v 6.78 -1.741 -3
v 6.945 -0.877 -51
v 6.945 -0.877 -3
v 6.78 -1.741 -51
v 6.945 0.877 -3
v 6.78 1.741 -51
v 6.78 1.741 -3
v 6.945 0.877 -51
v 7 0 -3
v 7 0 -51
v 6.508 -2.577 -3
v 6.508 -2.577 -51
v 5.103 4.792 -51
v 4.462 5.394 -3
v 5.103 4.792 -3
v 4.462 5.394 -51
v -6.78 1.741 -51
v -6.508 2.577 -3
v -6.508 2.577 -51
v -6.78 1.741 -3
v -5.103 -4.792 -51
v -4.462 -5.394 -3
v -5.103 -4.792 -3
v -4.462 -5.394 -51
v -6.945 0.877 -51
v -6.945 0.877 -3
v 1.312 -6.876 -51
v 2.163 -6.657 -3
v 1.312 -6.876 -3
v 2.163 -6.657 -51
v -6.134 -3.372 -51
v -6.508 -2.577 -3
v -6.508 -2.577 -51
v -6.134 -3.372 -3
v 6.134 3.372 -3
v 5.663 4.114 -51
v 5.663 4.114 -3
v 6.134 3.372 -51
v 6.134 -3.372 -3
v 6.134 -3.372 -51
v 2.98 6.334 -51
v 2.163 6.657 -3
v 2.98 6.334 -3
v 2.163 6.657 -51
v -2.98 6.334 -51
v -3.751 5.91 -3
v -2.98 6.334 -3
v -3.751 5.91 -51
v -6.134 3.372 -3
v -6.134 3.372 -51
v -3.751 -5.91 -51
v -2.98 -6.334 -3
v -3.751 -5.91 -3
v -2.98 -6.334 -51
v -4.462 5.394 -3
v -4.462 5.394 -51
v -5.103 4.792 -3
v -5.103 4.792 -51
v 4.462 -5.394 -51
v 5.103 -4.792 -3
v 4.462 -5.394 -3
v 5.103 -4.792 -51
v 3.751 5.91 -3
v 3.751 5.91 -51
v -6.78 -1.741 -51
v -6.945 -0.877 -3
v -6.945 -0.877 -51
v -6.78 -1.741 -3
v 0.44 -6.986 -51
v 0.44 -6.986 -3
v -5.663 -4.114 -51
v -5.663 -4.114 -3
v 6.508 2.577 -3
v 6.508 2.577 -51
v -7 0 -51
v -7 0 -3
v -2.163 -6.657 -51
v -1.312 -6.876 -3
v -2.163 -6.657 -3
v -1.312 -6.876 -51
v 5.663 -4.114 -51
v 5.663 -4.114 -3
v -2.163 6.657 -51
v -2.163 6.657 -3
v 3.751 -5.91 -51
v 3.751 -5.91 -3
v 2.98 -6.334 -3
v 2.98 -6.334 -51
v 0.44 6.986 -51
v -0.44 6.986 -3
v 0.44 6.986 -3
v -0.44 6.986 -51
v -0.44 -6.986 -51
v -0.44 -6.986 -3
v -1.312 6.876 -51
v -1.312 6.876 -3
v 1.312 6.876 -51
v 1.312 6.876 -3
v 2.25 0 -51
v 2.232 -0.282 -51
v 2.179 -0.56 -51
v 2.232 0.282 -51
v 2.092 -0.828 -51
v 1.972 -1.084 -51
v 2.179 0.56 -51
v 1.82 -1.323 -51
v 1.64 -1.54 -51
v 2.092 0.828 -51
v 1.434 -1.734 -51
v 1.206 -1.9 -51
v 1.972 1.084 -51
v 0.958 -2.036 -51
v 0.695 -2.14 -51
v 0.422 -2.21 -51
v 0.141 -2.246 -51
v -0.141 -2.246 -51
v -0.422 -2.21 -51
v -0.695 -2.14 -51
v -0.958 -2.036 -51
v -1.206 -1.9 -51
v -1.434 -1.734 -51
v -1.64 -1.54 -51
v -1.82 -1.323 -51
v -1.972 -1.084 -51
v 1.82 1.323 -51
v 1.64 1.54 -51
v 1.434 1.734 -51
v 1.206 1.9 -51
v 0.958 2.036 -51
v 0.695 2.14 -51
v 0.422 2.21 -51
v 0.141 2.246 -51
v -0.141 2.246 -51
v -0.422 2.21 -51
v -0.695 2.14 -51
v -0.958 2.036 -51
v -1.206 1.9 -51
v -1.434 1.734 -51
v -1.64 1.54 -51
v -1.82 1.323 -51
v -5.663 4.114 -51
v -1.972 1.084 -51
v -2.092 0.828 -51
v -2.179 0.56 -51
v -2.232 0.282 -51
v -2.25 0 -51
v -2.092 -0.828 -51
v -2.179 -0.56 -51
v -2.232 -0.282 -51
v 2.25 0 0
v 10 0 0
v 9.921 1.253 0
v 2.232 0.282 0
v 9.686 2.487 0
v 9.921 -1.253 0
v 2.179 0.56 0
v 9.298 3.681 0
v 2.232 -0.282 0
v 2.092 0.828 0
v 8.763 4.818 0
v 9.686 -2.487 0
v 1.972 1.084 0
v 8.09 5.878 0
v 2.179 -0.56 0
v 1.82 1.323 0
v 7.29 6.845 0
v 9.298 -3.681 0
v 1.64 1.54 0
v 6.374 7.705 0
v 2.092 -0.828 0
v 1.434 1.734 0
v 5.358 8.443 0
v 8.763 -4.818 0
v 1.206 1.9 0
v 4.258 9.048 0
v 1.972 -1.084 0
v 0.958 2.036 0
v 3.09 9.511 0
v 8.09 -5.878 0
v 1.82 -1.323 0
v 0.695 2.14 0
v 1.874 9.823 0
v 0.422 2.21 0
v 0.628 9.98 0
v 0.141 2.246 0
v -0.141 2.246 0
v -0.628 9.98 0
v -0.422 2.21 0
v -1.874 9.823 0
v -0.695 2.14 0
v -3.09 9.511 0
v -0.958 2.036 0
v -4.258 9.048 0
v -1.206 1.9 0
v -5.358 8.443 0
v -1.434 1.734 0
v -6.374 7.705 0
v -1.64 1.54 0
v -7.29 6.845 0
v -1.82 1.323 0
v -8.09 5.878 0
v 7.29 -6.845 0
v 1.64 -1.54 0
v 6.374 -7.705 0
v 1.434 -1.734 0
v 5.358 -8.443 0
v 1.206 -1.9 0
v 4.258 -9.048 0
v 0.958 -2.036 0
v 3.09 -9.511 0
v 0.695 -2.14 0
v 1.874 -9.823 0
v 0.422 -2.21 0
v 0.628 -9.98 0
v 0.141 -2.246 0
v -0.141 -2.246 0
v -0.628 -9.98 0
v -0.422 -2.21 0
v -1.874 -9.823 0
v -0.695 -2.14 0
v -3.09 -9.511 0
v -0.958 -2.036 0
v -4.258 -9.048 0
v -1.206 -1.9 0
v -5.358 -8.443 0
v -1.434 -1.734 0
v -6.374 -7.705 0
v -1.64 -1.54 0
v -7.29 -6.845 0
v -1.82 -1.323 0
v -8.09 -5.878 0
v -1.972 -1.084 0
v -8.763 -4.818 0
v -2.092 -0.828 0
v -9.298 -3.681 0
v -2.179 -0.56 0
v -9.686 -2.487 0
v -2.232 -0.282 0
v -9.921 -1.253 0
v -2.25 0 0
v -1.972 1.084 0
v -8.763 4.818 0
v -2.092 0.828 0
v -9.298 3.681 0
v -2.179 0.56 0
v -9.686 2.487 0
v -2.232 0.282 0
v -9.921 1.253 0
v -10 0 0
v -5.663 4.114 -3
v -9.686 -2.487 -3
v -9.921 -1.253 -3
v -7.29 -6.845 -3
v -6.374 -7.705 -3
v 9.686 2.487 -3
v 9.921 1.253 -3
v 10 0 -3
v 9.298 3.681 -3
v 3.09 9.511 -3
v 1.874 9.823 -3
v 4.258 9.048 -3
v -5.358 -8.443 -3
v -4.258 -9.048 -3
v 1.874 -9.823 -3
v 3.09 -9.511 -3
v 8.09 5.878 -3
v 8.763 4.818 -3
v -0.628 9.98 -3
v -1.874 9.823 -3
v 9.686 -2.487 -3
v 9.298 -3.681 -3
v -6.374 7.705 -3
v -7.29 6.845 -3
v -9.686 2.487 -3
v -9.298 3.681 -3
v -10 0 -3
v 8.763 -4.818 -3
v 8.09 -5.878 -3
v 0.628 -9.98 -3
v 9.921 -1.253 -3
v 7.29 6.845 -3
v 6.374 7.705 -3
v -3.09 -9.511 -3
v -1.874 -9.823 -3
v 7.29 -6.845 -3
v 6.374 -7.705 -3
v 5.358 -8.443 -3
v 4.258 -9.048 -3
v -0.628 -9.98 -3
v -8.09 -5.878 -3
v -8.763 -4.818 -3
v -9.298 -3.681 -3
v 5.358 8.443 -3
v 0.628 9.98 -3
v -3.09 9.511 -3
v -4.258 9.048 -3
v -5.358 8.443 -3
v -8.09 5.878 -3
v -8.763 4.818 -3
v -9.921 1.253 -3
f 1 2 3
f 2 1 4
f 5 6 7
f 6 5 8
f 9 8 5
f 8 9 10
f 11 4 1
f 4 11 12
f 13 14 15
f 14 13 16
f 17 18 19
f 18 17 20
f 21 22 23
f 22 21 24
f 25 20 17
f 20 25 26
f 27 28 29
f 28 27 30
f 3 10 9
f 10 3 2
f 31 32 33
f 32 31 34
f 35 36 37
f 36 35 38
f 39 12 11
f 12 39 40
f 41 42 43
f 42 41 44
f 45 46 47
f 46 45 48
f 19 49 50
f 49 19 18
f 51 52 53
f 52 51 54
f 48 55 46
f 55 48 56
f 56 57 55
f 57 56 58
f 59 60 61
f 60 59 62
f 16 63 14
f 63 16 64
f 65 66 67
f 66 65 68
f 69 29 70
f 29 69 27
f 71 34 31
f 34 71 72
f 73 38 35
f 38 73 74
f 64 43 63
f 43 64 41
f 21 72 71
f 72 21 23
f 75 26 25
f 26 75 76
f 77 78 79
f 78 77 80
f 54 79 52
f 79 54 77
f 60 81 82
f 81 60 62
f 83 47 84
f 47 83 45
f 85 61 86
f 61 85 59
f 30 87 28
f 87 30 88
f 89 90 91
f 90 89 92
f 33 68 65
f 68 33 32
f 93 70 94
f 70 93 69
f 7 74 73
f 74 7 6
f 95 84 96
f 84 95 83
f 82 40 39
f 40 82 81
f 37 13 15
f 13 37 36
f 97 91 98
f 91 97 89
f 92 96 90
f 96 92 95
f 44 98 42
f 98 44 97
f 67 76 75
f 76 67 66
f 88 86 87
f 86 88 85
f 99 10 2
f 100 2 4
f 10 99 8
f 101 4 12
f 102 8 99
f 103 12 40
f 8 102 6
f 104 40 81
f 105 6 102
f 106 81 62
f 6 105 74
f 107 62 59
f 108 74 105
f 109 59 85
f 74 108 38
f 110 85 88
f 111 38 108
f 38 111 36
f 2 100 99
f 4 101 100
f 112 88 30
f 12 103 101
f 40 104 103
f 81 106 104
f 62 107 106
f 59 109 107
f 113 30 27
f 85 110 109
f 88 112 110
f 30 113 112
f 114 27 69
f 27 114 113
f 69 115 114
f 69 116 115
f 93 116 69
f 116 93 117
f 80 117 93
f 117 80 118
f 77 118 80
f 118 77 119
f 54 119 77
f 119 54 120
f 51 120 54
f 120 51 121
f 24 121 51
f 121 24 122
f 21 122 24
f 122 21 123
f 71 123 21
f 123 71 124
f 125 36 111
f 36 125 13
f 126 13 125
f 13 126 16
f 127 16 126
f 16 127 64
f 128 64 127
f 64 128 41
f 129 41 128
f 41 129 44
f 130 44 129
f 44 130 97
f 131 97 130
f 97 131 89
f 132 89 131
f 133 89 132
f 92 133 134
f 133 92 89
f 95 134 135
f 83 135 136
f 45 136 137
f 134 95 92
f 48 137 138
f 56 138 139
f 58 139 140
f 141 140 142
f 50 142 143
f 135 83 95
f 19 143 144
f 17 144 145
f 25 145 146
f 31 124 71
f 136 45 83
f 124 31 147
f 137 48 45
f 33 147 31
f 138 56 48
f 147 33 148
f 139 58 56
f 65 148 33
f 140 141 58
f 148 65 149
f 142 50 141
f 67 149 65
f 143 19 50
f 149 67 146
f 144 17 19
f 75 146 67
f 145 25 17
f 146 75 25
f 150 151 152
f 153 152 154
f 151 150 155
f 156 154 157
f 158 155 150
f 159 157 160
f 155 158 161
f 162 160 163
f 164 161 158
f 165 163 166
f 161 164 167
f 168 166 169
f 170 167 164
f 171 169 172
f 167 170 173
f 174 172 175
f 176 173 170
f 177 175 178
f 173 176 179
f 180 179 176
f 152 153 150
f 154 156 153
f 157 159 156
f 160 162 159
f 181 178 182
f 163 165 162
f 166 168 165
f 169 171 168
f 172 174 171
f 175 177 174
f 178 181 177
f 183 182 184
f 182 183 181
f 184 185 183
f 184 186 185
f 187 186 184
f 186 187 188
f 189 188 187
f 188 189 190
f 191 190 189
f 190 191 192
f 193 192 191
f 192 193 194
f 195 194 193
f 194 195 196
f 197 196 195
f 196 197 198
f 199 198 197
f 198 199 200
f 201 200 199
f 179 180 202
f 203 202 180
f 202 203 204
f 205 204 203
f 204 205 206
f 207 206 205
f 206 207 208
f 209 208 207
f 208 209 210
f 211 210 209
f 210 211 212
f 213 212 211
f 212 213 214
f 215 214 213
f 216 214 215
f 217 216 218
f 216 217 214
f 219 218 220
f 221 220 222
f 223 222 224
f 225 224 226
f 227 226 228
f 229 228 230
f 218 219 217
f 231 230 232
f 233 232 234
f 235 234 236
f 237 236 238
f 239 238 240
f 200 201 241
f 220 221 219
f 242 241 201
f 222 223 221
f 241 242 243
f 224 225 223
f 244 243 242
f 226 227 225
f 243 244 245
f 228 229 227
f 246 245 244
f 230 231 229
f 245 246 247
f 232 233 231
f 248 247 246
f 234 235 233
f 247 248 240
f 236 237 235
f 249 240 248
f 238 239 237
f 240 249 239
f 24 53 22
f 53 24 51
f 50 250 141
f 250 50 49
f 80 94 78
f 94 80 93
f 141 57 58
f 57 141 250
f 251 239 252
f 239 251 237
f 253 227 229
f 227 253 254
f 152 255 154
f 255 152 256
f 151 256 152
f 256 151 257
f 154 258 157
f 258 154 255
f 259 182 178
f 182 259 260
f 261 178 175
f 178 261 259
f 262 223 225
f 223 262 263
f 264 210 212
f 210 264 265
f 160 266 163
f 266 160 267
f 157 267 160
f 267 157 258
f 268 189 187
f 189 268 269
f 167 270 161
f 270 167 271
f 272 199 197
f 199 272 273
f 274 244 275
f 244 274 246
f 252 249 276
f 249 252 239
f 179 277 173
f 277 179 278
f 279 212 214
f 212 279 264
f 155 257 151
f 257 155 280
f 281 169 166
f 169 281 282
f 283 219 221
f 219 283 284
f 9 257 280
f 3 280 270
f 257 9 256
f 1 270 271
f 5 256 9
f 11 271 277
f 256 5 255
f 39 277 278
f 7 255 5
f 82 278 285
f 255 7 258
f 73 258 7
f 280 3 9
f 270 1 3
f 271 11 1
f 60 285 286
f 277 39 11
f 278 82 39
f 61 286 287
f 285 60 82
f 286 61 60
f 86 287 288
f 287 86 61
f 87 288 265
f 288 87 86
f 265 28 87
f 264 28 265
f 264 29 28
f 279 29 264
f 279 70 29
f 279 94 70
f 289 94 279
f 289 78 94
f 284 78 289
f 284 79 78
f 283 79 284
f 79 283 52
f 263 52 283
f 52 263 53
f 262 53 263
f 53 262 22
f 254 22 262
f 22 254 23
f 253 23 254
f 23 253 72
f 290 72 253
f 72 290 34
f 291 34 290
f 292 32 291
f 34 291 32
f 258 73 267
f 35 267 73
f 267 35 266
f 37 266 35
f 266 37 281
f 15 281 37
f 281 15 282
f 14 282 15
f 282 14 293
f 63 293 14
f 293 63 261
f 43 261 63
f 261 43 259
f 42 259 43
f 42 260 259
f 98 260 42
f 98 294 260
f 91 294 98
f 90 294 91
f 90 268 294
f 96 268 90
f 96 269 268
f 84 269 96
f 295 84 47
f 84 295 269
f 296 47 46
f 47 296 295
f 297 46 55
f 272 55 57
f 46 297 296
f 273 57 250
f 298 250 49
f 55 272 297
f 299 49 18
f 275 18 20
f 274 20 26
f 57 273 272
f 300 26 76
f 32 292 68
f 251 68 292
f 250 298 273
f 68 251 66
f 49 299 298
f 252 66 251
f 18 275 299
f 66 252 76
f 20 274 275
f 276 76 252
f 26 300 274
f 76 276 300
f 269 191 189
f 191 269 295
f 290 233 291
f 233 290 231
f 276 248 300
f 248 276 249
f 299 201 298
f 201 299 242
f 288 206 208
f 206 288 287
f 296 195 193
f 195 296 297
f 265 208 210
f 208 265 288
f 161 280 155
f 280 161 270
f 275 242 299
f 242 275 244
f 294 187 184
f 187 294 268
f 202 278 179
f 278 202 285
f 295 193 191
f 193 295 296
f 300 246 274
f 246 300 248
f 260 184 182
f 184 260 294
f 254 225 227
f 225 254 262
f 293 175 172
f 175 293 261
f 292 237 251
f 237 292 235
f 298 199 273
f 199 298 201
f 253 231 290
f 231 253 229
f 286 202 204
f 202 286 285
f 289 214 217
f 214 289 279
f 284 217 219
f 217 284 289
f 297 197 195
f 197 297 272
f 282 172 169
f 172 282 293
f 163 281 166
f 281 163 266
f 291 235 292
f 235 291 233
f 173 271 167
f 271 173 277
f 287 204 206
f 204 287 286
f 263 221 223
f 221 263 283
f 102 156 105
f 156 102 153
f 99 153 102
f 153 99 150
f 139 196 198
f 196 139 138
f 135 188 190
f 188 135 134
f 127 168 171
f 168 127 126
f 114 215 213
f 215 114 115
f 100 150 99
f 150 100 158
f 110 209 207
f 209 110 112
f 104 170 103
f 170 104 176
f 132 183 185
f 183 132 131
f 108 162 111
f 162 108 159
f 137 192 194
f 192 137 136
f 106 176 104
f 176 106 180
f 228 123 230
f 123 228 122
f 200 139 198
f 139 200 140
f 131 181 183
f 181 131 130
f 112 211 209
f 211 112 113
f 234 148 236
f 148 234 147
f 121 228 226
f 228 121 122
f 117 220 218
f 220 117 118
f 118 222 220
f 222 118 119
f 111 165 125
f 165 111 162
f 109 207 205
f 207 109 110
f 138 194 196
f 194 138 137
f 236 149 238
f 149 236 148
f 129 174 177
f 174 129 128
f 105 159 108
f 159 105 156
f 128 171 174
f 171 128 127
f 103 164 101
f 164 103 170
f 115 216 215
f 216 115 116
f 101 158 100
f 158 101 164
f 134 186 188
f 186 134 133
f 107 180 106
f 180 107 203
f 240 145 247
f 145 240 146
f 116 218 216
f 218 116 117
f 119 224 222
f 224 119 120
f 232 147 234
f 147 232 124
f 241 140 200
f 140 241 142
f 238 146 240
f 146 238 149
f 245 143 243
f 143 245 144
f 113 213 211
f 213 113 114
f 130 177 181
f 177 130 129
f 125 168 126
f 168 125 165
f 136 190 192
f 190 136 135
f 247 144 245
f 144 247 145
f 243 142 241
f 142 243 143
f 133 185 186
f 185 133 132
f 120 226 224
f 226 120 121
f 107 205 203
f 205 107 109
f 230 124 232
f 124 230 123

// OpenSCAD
$fn = 50;


difference() {
	union() {
		translate(v = [0, 0, -51.0000000000]) {
			cylinder(h = 51, r = 7.0000000000);
		}
		translate(v = [0, 0, -3.0000000000]) {
			cylinder(h = 3, r = 10.0000000000);
		}
	}
	union() {
		#translate(v = [0, 0, -51]) {
			cylinder(h = 51, r = 2.2500000000);
		}
	}
}
